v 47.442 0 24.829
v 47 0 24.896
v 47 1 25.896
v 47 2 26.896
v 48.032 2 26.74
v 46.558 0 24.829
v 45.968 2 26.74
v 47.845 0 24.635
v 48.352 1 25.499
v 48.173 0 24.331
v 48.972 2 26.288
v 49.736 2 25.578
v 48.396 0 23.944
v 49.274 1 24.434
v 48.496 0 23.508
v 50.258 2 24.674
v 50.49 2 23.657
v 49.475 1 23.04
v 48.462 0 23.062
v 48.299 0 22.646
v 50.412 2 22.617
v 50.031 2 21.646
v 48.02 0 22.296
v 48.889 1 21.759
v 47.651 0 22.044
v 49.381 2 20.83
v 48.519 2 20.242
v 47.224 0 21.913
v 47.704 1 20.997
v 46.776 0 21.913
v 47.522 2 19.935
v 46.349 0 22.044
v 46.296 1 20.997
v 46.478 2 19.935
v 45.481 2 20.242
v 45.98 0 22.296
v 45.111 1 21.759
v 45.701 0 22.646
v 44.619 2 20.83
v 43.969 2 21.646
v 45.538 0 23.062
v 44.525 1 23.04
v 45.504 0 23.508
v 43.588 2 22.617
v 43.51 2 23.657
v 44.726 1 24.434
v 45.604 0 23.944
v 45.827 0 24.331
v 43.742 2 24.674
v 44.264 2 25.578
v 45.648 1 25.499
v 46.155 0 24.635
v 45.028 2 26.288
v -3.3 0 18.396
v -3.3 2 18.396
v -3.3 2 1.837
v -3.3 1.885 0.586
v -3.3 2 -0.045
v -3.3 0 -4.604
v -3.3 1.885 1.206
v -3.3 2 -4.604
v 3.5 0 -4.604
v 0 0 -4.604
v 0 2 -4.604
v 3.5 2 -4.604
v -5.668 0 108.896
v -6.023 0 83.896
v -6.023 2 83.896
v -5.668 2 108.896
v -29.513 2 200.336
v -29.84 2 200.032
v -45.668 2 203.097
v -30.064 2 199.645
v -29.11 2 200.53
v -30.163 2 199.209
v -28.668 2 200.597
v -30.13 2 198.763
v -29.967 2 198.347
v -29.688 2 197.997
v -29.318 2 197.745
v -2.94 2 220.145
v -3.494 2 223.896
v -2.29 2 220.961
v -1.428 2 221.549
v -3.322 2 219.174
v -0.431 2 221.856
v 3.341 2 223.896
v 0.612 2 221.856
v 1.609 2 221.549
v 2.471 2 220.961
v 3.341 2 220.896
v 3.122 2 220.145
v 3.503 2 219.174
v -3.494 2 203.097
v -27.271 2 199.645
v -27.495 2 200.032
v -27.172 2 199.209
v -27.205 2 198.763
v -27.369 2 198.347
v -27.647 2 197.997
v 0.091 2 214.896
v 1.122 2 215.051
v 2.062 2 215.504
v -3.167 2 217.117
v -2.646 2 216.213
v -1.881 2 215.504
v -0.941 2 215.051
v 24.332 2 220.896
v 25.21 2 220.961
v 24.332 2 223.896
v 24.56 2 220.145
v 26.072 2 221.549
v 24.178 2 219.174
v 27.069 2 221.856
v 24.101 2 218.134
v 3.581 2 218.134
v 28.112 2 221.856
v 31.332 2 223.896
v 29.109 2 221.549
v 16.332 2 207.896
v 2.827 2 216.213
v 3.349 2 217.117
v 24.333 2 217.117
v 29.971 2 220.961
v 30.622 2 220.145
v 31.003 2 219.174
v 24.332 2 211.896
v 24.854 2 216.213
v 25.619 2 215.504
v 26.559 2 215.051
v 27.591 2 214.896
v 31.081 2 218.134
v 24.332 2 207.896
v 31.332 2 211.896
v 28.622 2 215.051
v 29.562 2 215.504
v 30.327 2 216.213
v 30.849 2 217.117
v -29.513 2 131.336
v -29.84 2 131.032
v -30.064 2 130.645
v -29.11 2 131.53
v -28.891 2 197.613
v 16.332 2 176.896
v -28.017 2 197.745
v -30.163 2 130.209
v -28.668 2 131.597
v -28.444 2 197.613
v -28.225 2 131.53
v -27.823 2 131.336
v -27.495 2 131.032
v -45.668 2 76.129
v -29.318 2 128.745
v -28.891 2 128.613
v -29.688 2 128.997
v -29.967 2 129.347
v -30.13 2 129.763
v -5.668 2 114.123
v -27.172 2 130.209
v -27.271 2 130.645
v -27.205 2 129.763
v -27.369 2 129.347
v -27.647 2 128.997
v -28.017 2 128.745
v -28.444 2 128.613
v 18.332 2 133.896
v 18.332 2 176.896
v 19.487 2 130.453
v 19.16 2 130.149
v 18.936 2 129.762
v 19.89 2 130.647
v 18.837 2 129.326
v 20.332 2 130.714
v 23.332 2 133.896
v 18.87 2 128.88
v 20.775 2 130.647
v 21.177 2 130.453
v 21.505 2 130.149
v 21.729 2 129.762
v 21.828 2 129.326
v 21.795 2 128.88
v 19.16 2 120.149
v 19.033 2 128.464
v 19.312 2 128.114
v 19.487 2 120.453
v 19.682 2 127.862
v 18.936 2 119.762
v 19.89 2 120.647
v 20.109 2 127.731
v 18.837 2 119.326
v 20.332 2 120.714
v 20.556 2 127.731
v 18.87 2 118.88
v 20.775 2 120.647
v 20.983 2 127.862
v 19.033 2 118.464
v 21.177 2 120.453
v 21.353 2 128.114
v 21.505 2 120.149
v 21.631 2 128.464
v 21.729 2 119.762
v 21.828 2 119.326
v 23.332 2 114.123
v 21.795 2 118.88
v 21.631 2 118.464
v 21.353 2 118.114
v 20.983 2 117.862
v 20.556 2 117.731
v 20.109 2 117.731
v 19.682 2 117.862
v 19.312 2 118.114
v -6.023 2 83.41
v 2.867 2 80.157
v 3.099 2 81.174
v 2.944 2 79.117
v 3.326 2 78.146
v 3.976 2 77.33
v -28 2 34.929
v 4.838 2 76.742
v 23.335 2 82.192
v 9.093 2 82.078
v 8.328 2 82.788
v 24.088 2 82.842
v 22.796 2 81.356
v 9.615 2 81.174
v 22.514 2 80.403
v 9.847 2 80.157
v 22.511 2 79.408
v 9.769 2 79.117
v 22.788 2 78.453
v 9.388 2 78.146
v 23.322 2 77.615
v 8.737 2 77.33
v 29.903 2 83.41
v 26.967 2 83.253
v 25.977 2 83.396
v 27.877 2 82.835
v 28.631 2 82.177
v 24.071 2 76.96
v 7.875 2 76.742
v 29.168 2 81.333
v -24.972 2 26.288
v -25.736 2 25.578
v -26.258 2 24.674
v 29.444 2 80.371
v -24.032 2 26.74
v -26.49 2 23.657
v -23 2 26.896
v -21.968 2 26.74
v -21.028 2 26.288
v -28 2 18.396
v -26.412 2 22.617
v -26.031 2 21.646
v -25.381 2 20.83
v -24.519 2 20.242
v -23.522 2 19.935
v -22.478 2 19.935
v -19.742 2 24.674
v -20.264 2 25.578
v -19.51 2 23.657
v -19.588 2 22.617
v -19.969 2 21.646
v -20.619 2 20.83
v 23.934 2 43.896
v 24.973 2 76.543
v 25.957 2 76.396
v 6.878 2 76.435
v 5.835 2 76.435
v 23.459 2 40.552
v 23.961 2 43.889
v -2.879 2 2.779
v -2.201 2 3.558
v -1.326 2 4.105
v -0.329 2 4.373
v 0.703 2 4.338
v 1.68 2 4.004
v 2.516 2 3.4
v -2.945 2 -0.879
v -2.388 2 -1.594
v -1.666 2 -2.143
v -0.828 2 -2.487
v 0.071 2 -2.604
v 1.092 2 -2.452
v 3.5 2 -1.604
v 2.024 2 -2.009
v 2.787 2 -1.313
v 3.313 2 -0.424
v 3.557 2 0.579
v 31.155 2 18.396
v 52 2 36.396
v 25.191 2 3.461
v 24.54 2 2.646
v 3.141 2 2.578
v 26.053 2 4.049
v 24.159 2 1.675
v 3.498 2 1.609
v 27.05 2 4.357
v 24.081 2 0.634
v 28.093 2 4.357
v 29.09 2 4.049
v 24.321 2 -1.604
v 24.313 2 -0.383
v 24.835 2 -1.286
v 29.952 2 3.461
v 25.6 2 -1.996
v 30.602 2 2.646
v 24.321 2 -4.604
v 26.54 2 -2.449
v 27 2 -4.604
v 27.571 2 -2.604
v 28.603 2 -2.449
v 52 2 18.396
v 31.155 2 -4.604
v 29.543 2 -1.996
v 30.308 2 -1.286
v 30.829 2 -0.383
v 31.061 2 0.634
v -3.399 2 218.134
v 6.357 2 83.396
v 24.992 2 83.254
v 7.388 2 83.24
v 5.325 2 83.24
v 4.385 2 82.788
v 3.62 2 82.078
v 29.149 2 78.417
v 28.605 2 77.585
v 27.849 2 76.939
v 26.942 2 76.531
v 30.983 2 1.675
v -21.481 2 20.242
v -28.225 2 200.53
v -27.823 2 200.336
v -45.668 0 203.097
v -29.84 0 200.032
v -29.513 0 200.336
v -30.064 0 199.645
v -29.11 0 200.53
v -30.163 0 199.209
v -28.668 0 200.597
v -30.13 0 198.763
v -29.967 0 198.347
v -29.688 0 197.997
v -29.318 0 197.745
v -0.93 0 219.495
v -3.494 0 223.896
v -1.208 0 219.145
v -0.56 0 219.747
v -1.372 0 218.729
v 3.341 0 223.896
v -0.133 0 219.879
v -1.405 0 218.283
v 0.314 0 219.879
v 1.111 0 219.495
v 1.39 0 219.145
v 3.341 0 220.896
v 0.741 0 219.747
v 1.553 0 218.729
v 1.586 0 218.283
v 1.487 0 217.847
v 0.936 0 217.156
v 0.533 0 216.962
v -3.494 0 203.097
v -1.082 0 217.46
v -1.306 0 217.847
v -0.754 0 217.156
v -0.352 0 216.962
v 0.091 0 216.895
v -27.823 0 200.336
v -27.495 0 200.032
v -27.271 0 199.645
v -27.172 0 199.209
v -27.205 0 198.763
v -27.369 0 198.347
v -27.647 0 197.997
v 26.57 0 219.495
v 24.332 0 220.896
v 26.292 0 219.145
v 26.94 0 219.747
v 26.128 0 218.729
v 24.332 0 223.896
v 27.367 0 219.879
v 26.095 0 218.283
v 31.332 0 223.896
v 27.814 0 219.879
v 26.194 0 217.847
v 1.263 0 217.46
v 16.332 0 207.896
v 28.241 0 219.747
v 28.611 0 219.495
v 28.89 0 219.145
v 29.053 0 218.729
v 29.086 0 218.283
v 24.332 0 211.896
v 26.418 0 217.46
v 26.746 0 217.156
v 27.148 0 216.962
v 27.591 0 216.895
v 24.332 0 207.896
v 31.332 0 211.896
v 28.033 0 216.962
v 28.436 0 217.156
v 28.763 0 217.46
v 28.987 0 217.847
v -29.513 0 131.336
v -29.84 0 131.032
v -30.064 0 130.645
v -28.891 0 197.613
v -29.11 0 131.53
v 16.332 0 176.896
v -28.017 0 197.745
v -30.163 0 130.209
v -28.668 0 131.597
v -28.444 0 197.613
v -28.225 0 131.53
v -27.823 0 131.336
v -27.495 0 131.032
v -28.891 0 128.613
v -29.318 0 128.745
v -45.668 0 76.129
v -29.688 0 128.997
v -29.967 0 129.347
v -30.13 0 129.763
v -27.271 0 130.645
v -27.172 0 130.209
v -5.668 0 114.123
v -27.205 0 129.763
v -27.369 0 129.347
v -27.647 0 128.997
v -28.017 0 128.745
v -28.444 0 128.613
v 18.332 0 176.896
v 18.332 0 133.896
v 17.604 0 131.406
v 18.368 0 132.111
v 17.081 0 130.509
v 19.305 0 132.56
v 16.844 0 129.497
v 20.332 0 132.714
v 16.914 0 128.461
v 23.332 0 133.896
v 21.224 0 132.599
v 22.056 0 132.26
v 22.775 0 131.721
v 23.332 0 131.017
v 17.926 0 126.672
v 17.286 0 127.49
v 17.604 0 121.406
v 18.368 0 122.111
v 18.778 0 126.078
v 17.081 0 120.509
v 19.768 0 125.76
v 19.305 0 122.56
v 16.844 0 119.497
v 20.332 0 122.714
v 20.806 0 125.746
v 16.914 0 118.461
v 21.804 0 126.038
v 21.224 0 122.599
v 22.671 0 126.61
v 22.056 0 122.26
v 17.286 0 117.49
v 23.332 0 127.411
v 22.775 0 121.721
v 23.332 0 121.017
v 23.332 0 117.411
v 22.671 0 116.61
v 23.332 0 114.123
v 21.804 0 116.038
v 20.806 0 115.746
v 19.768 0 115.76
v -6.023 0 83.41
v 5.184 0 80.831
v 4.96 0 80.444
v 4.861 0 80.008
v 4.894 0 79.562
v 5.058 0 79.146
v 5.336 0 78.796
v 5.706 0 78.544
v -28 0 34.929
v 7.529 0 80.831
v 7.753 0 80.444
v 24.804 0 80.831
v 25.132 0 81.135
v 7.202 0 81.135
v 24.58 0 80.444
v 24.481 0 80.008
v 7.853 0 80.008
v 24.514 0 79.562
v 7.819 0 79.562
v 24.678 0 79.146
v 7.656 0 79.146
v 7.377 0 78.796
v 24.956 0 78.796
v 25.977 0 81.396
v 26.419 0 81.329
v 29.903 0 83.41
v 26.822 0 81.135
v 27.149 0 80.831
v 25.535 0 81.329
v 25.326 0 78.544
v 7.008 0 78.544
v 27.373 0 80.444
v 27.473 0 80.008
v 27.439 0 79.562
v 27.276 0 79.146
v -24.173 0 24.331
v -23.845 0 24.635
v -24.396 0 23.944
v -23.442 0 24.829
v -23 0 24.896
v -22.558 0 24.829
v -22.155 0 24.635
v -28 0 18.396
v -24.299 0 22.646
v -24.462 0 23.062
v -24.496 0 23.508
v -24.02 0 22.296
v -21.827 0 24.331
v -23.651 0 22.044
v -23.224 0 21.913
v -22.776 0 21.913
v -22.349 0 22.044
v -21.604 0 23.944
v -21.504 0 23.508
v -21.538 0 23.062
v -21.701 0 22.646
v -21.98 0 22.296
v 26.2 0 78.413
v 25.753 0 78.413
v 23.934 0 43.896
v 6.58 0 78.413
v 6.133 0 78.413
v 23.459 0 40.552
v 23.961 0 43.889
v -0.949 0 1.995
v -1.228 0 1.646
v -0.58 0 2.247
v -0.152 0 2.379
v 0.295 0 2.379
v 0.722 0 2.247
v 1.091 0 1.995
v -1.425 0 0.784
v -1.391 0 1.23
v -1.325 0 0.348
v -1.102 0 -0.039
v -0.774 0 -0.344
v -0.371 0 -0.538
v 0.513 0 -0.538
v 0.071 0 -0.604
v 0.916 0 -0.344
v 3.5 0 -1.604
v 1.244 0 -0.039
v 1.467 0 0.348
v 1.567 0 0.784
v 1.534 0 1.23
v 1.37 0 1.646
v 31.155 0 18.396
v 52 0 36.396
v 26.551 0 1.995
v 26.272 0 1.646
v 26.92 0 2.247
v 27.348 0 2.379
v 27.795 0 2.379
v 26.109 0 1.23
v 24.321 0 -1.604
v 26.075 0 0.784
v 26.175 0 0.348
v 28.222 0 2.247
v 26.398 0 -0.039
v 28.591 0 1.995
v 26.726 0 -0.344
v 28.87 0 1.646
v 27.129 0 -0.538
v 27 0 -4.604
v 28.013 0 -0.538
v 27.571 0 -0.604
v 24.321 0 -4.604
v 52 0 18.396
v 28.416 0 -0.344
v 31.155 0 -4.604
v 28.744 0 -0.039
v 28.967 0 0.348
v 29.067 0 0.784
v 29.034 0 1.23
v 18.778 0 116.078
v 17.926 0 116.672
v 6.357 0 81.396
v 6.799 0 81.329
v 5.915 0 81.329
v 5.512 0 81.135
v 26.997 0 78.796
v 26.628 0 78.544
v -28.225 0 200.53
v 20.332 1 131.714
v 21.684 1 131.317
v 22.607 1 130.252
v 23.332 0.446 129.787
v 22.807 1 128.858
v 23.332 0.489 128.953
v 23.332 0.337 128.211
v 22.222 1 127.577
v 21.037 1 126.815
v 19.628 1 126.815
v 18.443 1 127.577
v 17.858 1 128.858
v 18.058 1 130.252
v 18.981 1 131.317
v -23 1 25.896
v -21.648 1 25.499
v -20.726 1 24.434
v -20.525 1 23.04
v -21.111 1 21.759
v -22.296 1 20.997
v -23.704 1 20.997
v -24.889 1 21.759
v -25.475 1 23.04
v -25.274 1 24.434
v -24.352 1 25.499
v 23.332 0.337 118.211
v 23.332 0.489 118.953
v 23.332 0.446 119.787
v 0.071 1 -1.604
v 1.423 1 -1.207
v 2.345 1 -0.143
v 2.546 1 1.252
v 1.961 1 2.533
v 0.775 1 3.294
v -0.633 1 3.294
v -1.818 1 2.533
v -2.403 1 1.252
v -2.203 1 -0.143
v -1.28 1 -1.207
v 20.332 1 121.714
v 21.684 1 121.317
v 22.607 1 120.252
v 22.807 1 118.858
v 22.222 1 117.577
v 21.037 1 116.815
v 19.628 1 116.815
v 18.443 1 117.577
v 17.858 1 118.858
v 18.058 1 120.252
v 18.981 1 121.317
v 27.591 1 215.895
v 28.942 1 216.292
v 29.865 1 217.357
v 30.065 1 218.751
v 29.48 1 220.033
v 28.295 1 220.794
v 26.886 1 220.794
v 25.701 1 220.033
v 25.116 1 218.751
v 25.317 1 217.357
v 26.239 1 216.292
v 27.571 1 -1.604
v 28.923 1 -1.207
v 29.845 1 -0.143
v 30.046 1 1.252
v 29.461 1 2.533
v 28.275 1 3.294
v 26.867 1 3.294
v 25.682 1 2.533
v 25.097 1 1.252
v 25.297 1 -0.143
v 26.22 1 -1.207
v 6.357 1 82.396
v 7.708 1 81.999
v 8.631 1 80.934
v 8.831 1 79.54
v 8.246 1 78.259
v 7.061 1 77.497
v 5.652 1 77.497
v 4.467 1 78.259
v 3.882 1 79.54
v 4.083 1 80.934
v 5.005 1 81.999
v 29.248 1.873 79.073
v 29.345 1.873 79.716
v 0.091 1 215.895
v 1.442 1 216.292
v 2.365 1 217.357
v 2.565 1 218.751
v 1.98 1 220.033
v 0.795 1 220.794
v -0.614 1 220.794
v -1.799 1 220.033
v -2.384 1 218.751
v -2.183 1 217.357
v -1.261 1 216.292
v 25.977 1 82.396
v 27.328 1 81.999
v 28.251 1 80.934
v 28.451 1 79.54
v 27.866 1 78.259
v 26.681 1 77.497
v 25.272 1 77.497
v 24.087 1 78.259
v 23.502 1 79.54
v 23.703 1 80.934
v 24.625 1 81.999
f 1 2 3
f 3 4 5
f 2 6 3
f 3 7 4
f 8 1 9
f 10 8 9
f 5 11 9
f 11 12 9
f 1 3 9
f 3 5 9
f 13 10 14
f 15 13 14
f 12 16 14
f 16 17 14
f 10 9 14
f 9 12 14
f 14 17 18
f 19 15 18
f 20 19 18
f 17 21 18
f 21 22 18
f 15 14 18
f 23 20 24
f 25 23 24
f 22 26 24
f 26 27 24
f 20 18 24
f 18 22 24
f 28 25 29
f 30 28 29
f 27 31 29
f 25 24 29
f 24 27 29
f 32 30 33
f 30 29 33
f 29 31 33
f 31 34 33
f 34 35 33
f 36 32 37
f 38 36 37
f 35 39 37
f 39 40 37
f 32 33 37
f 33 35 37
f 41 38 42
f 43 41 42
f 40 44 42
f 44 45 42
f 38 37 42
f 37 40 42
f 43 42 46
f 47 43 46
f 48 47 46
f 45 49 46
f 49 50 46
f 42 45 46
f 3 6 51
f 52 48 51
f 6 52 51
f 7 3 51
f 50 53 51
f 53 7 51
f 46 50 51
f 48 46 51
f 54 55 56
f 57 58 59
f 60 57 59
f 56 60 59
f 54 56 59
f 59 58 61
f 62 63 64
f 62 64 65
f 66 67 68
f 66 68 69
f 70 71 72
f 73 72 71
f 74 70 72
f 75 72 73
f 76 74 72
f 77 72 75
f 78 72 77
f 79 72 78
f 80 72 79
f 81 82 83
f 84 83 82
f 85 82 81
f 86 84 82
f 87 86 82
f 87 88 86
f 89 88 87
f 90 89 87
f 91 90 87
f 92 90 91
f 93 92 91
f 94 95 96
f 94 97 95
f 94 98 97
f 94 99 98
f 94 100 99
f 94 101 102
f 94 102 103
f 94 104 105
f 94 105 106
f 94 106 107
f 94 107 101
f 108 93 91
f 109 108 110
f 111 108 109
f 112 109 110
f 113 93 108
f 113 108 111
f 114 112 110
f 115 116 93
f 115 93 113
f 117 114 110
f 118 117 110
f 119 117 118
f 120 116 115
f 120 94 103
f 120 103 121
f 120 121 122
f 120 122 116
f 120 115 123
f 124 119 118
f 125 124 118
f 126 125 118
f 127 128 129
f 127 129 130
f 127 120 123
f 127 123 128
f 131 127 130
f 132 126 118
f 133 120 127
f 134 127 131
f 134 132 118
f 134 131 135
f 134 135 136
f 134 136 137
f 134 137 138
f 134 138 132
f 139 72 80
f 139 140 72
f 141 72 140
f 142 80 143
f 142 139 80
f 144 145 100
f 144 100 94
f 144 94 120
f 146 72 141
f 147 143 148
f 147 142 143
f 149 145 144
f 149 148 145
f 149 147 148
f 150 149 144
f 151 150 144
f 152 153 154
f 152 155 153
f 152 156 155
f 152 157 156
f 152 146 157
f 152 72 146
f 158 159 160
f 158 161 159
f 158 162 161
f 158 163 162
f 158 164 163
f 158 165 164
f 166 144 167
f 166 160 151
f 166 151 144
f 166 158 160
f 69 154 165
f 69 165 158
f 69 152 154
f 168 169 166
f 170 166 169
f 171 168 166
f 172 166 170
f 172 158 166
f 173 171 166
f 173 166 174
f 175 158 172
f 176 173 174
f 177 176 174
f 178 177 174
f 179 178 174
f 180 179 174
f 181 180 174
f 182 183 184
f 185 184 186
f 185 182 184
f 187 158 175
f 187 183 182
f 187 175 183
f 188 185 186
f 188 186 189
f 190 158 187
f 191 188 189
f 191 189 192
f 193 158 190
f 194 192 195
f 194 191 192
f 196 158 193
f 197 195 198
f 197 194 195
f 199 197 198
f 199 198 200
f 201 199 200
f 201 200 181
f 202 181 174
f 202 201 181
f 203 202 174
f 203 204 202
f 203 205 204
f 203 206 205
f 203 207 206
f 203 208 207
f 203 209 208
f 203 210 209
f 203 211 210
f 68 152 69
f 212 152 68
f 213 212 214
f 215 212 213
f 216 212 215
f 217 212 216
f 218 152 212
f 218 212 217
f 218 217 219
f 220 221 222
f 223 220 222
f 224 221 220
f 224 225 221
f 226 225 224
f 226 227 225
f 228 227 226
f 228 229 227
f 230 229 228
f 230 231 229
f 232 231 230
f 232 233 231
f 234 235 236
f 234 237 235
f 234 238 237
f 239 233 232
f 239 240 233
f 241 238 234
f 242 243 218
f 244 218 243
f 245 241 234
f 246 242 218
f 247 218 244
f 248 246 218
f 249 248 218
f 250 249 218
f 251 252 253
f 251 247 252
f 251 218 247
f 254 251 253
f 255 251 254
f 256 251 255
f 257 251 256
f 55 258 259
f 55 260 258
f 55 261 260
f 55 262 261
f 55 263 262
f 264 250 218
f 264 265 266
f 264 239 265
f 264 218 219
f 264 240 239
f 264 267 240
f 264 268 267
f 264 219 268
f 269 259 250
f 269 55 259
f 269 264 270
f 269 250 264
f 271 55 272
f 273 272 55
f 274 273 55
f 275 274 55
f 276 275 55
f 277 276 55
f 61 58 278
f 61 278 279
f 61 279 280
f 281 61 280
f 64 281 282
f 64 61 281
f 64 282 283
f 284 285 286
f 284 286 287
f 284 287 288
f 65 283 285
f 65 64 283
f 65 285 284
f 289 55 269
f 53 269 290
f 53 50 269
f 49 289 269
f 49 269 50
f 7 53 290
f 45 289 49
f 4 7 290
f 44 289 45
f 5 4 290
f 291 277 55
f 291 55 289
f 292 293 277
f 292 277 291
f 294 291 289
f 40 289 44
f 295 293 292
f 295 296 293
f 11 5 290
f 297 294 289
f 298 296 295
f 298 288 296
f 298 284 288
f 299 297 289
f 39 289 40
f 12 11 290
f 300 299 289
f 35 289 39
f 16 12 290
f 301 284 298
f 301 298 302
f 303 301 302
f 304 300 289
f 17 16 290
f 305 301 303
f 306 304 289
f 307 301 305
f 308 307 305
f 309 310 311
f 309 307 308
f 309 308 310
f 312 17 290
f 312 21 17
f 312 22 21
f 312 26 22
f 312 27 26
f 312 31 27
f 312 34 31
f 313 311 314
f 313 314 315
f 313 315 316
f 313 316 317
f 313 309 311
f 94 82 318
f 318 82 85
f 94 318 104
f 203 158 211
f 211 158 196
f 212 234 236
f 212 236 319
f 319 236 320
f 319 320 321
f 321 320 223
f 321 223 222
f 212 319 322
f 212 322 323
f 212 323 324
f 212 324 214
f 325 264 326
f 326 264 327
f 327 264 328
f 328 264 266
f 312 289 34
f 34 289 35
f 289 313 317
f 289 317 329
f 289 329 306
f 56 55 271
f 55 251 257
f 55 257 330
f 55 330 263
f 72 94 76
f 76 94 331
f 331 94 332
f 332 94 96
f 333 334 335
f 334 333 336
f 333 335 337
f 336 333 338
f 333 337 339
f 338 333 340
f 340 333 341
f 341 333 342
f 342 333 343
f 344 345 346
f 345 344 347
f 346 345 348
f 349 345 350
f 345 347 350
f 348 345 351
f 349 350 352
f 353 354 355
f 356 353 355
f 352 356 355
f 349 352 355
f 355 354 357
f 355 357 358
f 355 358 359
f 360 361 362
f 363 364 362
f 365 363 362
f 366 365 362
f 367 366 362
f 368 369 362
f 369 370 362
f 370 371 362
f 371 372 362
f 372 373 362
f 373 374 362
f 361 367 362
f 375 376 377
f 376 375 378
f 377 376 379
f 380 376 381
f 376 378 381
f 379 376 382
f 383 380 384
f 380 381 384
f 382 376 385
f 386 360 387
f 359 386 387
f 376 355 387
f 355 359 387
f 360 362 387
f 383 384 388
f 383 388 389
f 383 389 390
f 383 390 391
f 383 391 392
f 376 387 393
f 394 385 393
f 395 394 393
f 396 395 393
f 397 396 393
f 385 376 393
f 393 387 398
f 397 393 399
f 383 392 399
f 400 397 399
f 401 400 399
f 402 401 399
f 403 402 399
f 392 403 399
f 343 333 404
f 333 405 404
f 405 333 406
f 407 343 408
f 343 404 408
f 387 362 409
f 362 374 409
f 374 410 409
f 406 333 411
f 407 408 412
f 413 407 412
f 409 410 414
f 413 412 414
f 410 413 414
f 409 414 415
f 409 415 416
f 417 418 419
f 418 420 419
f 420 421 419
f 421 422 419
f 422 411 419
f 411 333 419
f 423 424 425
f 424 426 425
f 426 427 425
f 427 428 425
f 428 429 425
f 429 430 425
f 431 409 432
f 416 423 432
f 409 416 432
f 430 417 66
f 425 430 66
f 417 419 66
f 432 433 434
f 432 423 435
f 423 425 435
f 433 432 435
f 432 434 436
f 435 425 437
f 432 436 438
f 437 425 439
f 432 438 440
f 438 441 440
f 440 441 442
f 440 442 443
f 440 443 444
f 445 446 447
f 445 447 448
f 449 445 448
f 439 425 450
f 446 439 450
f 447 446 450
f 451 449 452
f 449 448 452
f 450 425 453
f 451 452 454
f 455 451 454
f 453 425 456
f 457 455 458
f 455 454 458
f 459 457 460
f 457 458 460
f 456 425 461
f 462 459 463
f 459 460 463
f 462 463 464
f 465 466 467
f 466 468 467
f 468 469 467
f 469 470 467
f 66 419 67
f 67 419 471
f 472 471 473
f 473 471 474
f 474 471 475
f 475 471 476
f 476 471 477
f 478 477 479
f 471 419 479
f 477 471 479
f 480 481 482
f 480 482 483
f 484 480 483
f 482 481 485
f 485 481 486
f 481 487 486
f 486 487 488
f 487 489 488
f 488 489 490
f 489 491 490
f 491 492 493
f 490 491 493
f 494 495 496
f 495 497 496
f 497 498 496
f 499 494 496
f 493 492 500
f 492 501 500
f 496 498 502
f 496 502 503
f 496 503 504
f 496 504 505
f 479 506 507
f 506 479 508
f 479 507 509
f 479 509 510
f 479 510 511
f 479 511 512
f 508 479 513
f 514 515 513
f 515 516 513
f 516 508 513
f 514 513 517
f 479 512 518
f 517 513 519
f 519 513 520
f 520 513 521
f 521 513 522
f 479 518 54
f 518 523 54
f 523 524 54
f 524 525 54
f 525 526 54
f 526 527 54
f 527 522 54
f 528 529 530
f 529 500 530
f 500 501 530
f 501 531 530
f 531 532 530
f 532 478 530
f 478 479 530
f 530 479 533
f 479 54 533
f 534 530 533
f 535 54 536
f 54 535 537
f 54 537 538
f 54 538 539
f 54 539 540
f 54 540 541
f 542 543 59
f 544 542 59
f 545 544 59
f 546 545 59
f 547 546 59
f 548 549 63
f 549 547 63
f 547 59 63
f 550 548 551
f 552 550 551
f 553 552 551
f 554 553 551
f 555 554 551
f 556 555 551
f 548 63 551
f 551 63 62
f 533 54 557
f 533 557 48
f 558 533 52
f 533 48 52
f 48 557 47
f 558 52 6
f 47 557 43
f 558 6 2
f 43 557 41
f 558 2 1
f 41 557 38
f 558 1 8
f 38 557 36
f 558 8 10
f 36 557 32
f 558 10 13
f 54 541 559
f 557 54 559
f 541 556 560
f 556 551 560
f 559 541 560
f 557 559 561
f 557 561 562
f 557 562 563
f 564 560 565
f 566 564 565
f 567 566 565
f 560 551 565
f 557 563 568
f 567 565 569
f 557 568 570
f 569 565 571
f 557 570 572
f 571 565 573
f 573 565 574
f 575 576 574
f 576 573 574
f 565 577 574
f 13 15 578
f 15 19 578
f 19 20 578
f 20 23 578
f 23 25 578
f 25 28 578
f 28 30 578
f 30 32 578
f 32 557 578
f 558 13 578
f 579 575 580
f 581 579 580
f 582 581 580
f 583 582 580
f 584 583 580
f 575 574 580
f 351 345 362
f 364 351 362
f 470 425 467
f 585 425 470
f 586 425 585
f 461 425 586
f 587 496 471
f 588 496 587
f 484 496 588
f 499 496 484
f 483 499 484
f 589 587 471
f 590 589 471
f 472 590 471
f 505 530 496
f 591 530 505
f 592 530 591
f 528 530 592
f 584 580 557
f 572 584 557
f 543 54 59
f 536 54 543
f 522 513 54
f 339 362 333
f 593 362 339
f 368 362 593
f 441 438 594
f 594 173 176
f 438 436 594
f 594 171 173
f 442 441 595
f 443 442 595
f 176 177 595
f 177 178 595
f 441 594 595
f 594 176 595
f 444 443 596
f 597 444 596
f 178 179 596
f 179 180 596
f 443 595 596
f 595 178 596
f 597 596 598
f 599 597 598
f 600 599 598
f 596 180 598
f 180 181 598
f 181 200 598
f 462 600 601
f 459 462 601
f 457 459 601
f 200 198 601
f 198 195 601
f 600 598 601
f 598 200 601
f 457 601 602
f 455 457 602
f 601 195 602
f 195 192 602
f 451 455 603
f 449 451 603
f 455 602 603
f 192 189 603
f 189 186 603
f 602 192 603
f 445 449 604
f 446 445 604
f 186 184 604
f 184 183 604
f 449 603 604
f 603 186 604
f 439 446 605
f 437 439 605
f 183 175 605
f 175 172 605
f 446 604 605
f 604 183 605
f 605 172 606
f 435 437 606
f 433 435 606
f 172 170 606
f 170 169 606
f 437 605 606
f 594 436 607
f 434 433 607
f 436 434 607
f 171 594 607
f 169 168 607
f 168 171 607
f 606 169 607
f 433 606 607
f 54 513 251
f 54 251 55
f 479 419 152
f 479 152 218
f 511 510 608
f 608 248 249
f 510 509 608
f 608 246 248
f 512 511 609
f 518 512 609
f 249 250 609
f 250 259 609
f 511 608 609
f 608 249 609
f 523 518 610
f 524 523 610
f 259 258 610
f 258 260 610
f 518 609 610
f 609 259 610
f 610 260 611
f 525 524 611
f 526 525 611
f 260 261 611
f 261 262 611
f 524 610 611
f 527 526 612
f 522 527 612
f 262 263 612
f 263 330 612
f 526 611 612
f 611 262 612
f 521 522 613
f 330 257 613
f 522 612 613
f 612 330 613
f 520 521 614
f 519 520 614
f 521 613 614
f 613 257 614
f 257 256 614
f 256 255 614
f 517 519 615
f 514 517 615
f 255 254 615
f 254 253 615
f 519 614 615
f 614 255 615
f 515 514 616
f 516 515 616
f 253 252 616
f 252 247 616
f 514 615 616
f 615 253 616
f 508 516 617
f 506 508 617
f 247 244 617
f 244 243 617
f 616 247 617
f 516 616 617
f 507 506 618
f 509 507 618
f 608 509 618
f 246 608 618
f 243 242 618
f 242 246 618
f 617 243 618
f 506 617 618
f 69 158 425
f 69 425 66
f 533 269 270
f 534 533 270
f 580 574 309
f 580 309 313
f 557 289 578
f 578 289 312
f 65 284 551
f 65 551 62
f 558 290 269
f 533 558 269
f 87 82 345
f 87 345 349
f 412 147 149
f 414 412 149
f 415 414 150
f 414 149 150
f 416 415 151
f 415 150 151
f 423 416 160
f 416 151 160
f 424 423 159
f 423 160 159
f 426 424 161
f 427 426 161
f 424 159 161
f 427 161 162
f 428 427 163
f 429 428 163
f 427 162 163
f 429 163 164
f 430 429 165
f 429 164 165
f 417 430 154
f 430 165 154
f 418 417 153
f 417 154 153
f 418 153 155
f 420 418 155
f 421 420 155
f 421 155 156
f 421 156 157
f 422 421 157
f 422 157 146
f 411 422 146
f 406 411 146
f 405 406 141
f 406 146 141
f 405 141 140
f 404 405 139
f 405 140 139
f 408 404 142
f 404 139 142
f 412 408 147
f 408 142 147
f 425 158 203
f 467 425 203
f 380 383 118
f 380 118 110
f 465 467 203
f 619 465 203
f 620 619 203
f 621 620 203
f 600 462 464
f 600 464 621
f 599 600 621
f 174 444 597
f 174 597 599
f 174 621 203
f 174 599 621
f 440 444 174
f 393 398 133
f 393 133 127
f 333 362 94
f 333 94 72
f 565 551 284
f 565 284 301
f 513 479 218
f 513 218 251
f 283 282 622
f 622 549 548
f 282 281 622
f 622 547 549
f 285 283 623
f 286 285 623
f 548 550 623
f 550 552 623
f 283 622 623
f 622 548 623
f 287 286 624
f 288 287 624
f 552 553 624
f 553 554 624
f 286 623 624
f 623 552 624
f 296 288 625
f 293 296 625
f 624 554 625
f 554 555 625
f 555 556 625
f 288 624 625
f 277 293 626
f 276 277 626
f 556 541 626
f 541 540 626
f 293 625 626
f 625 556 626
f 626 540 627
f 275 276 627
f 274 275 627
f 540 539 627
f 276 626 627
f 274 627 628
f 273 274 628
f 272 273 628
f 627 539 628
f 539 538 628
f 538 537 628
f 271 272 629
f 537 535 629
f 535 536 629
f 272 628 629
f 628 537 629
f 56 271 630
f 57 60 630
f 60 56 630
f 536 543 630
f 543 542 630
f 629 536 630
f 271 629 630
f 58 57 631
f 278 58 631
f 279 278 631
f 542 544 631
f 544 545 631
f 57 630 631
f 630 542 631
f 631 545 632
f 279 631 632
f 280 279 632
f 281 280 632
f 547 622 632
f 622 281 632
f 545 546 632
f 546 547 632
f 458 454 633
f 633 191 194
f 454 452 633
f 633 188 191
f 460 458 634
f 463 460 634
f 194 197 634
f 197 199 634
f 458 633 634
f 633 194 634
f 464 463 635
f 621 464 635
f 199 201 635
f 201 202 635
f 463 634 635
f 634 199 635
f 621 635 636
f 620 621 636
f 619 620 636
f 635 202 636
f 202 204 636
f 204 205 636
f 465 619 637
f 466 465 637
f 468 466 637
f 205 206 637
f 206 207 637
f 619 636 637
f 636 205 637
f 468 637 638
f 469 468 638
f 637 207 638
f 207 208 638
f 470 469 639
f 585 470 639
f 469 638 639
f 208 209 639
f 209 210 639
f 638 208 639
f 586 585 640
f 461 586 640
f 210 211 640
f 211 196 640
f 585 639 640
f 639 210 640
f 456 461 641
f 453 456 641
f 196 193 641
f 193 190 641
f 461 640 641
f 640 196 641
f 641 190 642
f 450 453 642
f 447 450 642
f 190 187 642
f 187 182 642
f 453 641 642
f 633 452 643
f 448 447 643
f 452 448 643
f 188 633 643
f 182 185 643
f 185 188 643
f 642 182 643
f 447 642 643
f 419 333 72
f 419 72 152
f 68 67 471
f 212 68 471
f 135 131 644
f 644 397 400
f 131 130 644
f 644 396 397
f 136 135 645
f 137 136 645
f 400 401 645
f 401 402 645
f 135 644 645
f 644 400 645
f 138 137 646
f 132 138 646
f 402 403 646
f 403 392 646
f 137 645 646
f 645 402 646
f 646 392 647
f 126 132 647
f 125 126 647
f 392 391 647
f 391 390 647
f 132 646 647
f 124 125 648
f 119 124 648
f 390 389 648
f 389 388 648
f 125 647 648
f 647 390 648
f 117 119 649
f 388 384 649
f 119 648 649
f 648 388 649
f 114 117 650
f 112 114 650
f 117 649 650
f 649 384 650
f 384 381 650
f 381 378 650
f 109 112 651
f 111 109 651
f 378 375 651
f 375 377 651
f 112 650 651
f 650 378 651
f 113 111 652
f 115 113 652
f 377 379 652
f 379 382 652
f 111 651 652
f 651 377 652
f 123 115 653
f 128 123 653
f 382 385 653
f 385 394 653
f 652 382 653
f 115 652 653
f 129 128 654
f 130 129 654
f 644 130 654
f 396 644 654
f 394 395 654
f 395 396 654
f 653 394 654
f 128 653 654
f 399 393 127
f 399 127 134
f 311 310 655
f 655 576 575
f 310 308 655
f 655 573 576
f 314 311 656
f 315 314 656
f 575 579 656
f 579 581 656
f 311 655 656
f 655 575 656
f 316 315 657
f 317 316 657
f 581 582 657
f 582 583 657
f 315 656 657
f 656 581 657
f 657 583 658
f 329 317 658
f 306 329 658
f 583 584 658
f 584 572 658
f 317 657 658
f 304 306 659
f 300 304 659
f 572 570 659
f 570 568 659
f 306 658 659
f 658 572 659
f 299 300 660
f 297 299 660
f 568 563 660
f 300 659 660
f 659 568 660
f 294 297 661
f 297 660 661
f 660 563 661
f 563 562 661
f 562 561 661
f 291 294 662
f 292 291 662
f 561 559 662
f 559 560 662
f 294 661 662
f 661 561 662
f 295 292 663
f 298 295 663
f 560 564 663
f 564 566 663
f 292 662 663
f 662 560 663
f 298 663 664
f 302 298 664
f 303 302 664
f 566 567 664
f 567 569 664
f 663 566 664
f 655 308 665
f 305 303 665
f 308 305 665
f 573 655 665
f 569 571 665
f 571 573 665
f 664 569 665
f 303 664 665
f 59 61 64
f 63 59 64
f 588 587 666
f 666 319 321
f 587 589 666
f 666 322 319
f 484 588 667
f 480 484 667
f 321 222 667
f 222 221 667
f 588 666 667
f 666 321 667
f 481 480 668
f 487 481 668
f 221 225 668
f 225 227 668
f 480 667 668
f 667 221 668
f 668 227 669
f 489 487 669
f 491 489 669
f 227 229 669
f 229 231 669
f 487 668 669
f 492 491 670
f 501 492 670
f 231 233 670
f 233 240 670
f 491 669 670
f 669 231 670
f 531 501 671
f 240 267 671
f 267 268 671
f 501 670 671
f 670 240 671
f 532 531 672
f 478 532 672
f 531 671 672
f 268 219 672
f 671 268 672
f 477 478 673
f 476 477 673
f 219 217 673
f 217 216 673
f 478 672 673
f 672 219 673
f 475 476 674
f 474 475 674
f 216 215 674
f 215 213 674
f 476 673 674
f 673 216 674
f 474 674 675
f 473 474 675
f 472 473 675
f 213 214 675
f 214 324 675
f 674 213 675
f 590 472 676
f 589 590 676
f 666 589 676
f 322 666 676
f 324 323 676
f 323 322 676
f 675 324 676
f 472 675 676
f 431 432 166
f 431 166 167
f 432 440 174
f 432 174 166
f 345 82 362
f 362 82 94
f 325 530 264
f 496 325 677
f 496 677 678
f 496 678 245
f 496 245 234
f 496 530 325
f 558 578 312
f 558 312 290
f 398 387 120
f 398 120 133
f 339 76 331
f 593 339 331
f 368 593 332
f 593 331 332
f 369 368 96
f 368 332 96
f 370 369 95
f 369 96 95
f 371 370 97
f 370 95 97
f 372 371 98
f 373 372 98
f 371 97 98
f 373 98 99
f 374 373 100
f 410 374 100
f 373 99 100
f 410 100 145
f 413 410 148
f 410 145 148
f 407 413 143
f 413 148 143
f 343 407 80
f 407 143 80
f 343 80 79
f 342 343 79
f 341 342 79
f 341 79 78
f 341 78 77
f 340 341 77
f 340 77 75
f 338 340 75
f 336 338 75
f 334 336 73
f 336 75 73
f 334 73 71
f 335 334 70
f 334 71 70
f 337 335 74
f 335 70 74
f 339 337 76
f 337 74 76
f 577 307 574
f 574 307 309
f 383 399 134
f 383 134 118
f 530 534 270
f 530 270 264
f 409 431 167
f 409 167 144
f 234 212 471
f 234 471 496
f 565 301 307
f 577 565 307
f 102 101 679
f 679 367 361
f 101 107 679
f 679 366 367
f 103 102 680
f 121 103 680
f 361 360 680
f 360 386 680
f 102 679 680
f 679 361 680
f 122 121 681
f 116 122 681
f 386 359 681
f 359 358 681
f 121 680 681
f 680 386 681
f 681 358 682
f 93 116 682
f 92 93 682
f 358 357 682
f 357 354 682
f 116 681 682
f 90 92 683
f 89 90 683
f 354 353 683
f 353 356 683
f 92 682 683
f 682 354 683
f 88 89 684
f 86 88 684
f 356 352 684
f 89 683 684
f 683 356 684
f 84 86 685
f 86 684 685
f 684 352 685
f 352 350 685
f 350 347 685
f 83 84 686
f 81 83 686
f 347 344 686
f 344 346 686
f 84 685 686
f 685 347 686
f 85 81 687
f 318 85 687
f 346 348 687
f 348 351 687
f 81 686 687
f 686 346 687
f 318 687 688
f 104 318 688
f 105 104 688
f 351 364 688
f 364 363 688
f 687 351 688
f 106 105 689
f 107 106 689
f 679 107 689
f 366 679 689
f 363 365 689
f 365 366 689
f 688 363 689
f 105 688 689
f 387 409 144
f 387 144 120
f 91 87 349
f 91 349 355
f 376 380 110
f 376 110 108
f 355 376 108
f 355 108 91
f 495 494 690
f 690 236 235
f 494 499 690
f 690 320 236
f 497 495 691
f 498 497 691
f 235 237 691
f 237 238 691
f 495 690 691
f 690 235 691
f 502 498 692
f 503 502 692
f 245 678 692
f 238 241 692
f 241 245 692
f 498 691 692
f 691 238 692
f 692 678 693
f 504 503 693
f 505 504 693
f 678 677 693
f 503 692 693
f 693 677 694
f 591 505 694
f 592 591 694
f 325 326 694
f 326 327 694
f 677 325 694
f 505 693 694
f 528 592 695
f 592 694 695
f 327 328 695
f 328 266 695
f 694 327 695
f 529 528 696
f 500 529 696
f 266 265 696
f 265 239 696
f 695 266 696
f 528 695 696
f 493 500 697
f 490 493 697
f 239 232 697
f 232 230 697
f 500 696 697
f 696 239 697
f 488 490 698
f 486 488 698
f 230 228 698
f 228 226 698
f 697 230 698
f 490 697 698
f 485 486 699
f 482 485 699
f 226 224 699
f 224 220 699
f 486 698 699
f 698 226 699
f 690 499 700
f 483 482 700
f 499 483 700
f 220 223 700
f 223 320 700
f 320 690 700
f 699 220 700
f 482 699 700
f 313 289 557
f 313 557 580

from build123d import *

# Parameters (mm, degrees)
SKETCH1_R           = 1.5
BOSS_EXTRUDE1_DEPTH = 2
CHAMFER1_SIZE       = 2
SKETCH4_W           = 36.30312698
SKETCH4_H           = 0.486110151
CUT_EXTRUDE3_DEPTH  = 10
SKETCH5_W           = 29
SKETCH5_H           = 1.352839956
CUT_EXTRUDE4_DEPTH  = 10
SKETCH6_R           = 1.5
CUT_EXTRUDE5_DEPTH  = 2
SKETCH2_W           = 29
SKETCH2_H           = 5.227477133
CUT_EXTRUDE1_DEPTH  = 10
SKETCH7_R           = 1.5
CUT_EXTRUDE6_DEPTH  = 2
CHAMFER2_SIZE       = 2
CUT_EXTRUDE7_DEPTH  = 10
SKETCH9_W           = 2.845003066
SKETCH9_H           = 3
CUT_EXTRUDE8_DEPTH  = 2
SKETCH10_W          = 2.678834089
SKETCH10_H          = 3.000004318
BOSS_EXTRUDE2_DEPTH = 2
SKETCH11_W          = 3.5
SKETCH11_H          = 3
CUT_EXTRUDE9_DEPTH  = 2
SKETCH12_W          = 3.3
SKETCH12_H          = 23.000004318
BOSS_EXTRUDE3_DEPTH = 2
SKETCH13_W          = 2.845003066
SKETCH13_H          = 20
CUT_EXTRUDE10_DEPTH = 2
SKETCH14_R          = 1.5
CUT_EXTRUDE11_DEPTH = 2
CHAMFER3_SIZE       = 2
SKETCH15_W          = 0.991837727
SKETCH15_H          = 3
CUT_EXTRUDE12_DEPTH = 2
SKETCH16_W          = 0.826217407
SKETCH16_H          = 20.799074454
BOSS_EXTRUDE4_DEPTH = 2
SKETCH17_R          = 1.5
CUT_EXTRUDE13_DEPTH = 2
CHAMFER4_SIZE       = 2


# Some blends are built 0.0001 mm under size
with BuildPart() as part:
    # Sketch1 → Boss-Extrude1 (new body)
    with BuildSketch(Plane(origin=(0, 0, 0), x_dir=(1, 0, 0), z_dir=(0, 1, 0))):
        Polygon((0, 4.604246944), (7, 4.604246944), (7, 1.604246944), (27, 1.604246944), (27, 4.604246944), (34, 4.604246944), (34, -18.395753056), (52, -18.395753056), (52, -36.395753056), (23.933920219, -43.895753056), (29.976717731, -83.895753056), (-6.023282269, -83.895753056), (-5.667548556, -108.895753056), (23.332451444, -108.895753056), (23.332451444, -133.895753056), (18.332451444, -133.895753056), (18.332451444, -176.895753056), (16.332451444, -176.895753056), (16.332451444, -207.895753056), (24.332451444, -207.895753056), (24.332451444, -211.895753056), (31.332451444, -211.895753056), (31.332451444, -223.895753056), (24.332451444, -223.895753056), (24.332451444, -220.895753056), (4.332451444, -220.895753056), (4.332451444, -223.895753056), (-2.667548556, -223.895753056), (-2.667548556, -203.096678602), (-45.667548556, -203.096678602), (-45.667548556, -76.129309552), (-28, -34.929185263), (-28, -18.395753056), (0, -18.395753056), align=None)
        with Locations(Location((47, -23.395753056, 0), (0, 0, 270))):
            Circle(SKETCH1_R, mode=Mode.SUBTRACT)
        with Locations(Location((-23, -23.395753056, 0), (0, 0, 270))):
            Circle(SKETCH1_R, mode=Mode.SUBTRACT)
        with Locations(Location((25.976717731, -79.895753056, 0), (0, 0, 270))):
            Circle(SKETCH1_R, mode=Mode.SUBTRACT)
        with Locations(Location((6.356717731, -79.895753056, 0), (0, 0, 270))):
            Circle(SKETCH1_R, mode=Mode.SUBTRACT)
    extrude(amount=BOSS_EXTRUDE1_DEPTH)

    # Chamfer1
    # the kernel refuses this chamfer: 2 mm, written as the material it takes off along each edge
    with BuildSketch(Plane(origin=(6.356717731, 2, 79.895753056), x_dir=(0, 0, 1), z_dir=(-1, 0, 0))) as chamfer1_piece_1:
        Polygon((1.5, -CHAMFER1_SIZE), (1.5 + CHAMFER1_SIZE, 0), (1.5, 0), align=None)
    revolve(axis=Axis((6.356717731, 2, 79.895753056), (0, 1, 0)), mode=Mode.SUBTRACT)
    with BuildSketch(Plane(origin=(25.976717731, 2, 79.895753056), x_dir=(0, 0, 1), z_dir=(-1, 0, 0))) as chamfer1_piece_2:
        Polygon((1.5, -CHAMFER1_SIZE), (1.5 + CHAMFER1_SIZE, 0), (1.5, 0), align=None)
    revolve(axis=Axis((25.976717731, 2, 79.895753056), (0, 1, 0)), mode=Mode.SUBTRACT)
    with BuildSketch(Plane(origin=(-23, 2, 23.395753056), x_dir=(0, 0, 1), z_dir=(-1, 0, 0))) as chamfer1_piece_3:
        Polygon((1.5, -CHAMFER1_SIZE), (1.5 + CHAMFER1_SIZE, 0), (1.5, 0), align=None)
    revolve(axis=Axis((-23, 2, 23.395753056), (0, 1, 0)), mode=Mode.SUBTRACT)
    with BuildSketch(Plane(origin=(47, 2, 23.395753056), x_dir=(0, 0, 1), z_dir=(-1, 0, 0))) as chamfer1_piece_4:
        Polygon((1.5, -CHAMFER1_SIZE), (1.5 + CHAMFER1_SIZE, 0), (1.5, 0), align=None)
    revolve(axis=Axis((47, 2, 23.395753056), (0, 1, 0)), mode=Mode.SUBTRACT)

    # Sketch4 → Cut-Extrude3 (cut)
    with BuildSketch(Plane(origin=(0, 2, 0), x_dir=(1, 0, 0), z_dir=(0, 1, 0))):
        with Locations((12.128281221, -83.65269798)):
            Rectangle(SKETCH4_W, SKETCH4_H)
    extrude(amount=-CUT_EXTRUDE3_DEPTH, mode=Mode.SUBTRACT)

    # Sketch5 → Cut-Extrude4 (cut)
    with BuildSketch(Plane(origin=(0, 2, 0), x_dir=(1, 0, 0), z_dir=(0, 1, 0))):
        with Locations((8.832451444, -109.572173034)):
            Rectangle(SKETCH5_W, SKETCH5_H)
    extrude(amount=-CUT_EXTRUDE4_DEPTH, mode=Mode.SUBTRACT)

    # Sketch6 → Cut-Extrude5 (cut)
    with BuildSketch(Plane(origin=(0, 2, 0), x_dir=(1, 0, 0), z_dir=(0, 1, 0))):
        with Locations(Location((-28.667548556, -130.096678602, 0), (0, 0, 270))):
            Circle(SKETCH6_R)
        with Locations(Location((-28.667548556, -199.096678602, 0), (0, 0, 270))):
            Circle(SKETCH6_R)
    extrude(amount=-CUT_EXTRUDE5_DEPTH, mode=Mode.SUBTRACT)

    # Sketch2 → Cut-Extrude1 (cut)
    with BuildSketch(Plane(origin=(0, 2, 0), x_dir=(1, 0, 0), z_dir=(0, 1, 0))):
        with Locations((8.832451444, -111.509491623)):
            Rectangle(SKETCH2_W, SKETCH2_H)
    extrude(amount=-CUT_EXTRUDE1_DEPTH, mode=Mode.SUBTRACT)

    # Sketch7 → Cut-Extrude6 (cut)
    with BuildSketch(Plane(origin=(0, 2, 0), x_dir=(1, 0, 0), z_dir=(0, 1, 0))):
        with Locations(Location((20.332451444, -119.213897383, 0), (0, 0, 270))):
            Circle(SKETCH7_R)
        with Locations(Location((20.332451444, -129.213897383, 0), (0, 0, 270))):
            Circle(SKETCH7_R)
    extrude(amount=-CUT_EXTRUDE6_DEPTH, mode=Mode.SUBTRACT)

    # Chamfer2
    # the kernel refuses this chamfer: 2 mm, written as the material it takes off along each edge
    with BuildSketch(Plane(origin=(20.332451444, 0, 119.213897383), x_dir=(0, 0, 1), z_dir=(-1, 0, 0))) as chamfer2_piece_1:
        Polygon((1.5 + CHAMFER2_SIZE, 0), (1.5, CHAMFER2_SIZE), (1.5, 0), align=None)
    revolve(axis=Axis((20.332451444, 0, 119.213897383), (0, 1, 0)), mode=Mode.SUBTRACT)
    with BuildSketch(Plane(origin=(20.332451444, 0, 129.213897383), x_dir=(0, 0, 1), z_dir=(-1, 0, 0))) as chamfer2_piece_2:
        Polygon((1.5 + CHAMFER2_SIZE, 0), (1.5, CHAMFER2_SIZE), (1.5, 0), align=None)
    revolve(axis=Axis((20.332451444, 0, 129.213897383), (0, 1, 0)), mode=Mode.SUBTRACT)

    # Sketch8 → Cut-Extrude7 (cut)
    with BuildSketch(Plane(origin=(0, 2, 0), x_dir=(1, 0, 0), z_dir=(0, 1, 0))):
        Polygon((23.96091905, -43.888538253), (52, -36.395753056), (23.459204593, -40.551765872), align=None)
    extrude(amount=-CUT_EXTRUDE7_DEPTH, mode=Mode.SUBTRACT)

    # Sketch9 → Cut-Extrude8 (cut)
    with BuildSketch(Plane(origin=(0, 2, 0), x_dir=(1, 0, 0), z_dir=(0, 1, 0))):
        with Locations((32.577498467, 3.104246944)):
            Rectangle(SKETCH9_W, SKETCH9_H)
    extrude(amount=-CUT_EXTRUDE8_DEPTH, mode=Mode.SUBTRACT)

    # Sketch10 → Boss-Extrude2 (add)
    with BuildSketch(Plane(origin=(0, 2, 0), x_dir=(1, 0, 0), z_dir=(0, 1, 0))):
        with Locations((25.660582956, 3.104249103)):
            Rectangle(SKETCH10_W, SKETCH10_H)
    extrude(amount=-BOSS_EXTRUDE2_DEPTH)

    # Sketch11 → Cut-Extrude9 (cut)
    with BuildSketch(Plane(origin=(0, 2, 0), x_dir=(1, 0, 0), z_dir=(0, 1, 0))):
        with Locations((5.25, 3.104246944)):
            Rectangle(SKETCH11_W, SKETCH11_H)
    extrude(amount=-CUT_EXTRUDE9_DEPTH, mode=Mode.SUBTRACT)

    # Sketch12 → Boss-Extrude3 (add)
    with BuildSketch(Plane(origin=(0, 2, 0), x_dir=(1, 0, 0), z_dir=(0, 1, 0))):
        with Locations((-1.65, -6.895750897)):
            Rectangle(SKETCH12_W, SKETCH12_H)
    extrude(amount=-BOSS_EXTRUDE3_DEPTH)

    # Sketch13 → Cut-Extrude10 (cut)
    with BuildSketch(Plane(origin=(0, 2, 0), x_dir=(1, 0, 0), z_dir=(0, 1, 0))):
        with Locations((32.577498467, -8.395753056)):
            Rectangle(SKETCH13_W, SKETCH13_H)
    extrude(amount=-CUT_EXTRUDE10_DEPTH, mode=Mode.SUBTRACT)

    # Sketch14 → Cut-Extrude11 (cut)
    with BuildSketch(Plane.XZ):
        with Locations(Location((0.071165911, 0.895748738, 0), (0, 0, 270))):
            Circle(SKETCH14_R)
        with Locations(Location((27.571165911, 0.895748738, 0), (0, 0, 270))):
            Circle(SKETCH14_R)
    extrude(amount=-CUT_EXTRUDE11_DEPTH, mode=Mode.SUBTRACT)

    # Chamfer3
    # the kernel refuses this chamfer: 2 mm, written as the material it takes off along each edge
    with BuildSketch(Plane(origin=(0.071165911, 2, 0.895748738), x_dir=(0, 0, -1), z_dir=(-1, 0, 0))) as chamfer3_piece_1:
        Polygon((1.5 + CHAMFER3_SIZE, 0), (1.5, CHAMFER3_SIZE), (1.5, 0), align=None)
    revolve(axis=Axis((0.071165911, 2, 0.895748738), (0, -1, 0)), mode=Mode.SUBTRACT)
    with BuildSketch(Plane(origin=(27.571165911, 2, 0.895748738), x_dir=(0, 0, -1), z_dir=(-1, 0, 0))) as chamfer3_piece_2:
        Polygon((1.5 + CHAMFER3_SIZE, 0), (1.5, CHAMFER3_SIZE), (1.5, 0), align=None)
    revolve(axis=Axis((27.571165911, 2, 0.895748738), (0, -1, 0)), mode=Mode.SUBTRACT)

    # Sketch15 → Cut-Extrude12 (cut)
    with BuildSketch(Plane(origin=(0, 2, 0), x_dir=(1, 0, 0), z_dir=(0, 1, 0))):
        with Locations((3.836532581, -222.395753056)):
            Rectangle(SKETCH15_W, SKETCH15_H)
    extrude(amount=-CUT_EXTRUDE12_DEPTH, mode=Mode.SUBTRACT)

    # Sketch16 → Boss-Extrude4 (add)
    with BuildSketch(Plane(origin=(0, 2, 0), x_dir=(1, 0, 0), z_dir=(0, 1, 0))):
        with Locations((-3.08065726, -213.496215829)):
            Rectangle(SKETCH16_W, SKETCH16_H)
    extrude(amount=-BOSS_EXTRUDE4_DEPTH)

    # Sketch17 → Cut-Extrude13 (cut)
    with BuildSketch(Plane.XZ):
        with Locations(Location((27.590613723, 218.395405635, 0), (0, 0, 270))):
            Circle(SKETCH17_R)
        with Locations(Location((0.090613723, 218.395405628, 0), (0, 0, 270))):
            Circle(SKETCH17_R)
    extrude(amount=-CUT_EXTRUDE13_DEPTH, mode=Mode.SUBTRACT)

    # Chamfer4
    chamfer4_edges = [part.edges().sort_by_distance(p)[0] for p in [
        (27.590613723, 2, 219.895405635),
        (0.090613723, 2, 219.895405628),
    ]]
    chamfer(chamfer4_edges, length=CHAMFER4_SIZE - 0.0001)  # a hair under: the kernel refuses the full size


solid = part.part
